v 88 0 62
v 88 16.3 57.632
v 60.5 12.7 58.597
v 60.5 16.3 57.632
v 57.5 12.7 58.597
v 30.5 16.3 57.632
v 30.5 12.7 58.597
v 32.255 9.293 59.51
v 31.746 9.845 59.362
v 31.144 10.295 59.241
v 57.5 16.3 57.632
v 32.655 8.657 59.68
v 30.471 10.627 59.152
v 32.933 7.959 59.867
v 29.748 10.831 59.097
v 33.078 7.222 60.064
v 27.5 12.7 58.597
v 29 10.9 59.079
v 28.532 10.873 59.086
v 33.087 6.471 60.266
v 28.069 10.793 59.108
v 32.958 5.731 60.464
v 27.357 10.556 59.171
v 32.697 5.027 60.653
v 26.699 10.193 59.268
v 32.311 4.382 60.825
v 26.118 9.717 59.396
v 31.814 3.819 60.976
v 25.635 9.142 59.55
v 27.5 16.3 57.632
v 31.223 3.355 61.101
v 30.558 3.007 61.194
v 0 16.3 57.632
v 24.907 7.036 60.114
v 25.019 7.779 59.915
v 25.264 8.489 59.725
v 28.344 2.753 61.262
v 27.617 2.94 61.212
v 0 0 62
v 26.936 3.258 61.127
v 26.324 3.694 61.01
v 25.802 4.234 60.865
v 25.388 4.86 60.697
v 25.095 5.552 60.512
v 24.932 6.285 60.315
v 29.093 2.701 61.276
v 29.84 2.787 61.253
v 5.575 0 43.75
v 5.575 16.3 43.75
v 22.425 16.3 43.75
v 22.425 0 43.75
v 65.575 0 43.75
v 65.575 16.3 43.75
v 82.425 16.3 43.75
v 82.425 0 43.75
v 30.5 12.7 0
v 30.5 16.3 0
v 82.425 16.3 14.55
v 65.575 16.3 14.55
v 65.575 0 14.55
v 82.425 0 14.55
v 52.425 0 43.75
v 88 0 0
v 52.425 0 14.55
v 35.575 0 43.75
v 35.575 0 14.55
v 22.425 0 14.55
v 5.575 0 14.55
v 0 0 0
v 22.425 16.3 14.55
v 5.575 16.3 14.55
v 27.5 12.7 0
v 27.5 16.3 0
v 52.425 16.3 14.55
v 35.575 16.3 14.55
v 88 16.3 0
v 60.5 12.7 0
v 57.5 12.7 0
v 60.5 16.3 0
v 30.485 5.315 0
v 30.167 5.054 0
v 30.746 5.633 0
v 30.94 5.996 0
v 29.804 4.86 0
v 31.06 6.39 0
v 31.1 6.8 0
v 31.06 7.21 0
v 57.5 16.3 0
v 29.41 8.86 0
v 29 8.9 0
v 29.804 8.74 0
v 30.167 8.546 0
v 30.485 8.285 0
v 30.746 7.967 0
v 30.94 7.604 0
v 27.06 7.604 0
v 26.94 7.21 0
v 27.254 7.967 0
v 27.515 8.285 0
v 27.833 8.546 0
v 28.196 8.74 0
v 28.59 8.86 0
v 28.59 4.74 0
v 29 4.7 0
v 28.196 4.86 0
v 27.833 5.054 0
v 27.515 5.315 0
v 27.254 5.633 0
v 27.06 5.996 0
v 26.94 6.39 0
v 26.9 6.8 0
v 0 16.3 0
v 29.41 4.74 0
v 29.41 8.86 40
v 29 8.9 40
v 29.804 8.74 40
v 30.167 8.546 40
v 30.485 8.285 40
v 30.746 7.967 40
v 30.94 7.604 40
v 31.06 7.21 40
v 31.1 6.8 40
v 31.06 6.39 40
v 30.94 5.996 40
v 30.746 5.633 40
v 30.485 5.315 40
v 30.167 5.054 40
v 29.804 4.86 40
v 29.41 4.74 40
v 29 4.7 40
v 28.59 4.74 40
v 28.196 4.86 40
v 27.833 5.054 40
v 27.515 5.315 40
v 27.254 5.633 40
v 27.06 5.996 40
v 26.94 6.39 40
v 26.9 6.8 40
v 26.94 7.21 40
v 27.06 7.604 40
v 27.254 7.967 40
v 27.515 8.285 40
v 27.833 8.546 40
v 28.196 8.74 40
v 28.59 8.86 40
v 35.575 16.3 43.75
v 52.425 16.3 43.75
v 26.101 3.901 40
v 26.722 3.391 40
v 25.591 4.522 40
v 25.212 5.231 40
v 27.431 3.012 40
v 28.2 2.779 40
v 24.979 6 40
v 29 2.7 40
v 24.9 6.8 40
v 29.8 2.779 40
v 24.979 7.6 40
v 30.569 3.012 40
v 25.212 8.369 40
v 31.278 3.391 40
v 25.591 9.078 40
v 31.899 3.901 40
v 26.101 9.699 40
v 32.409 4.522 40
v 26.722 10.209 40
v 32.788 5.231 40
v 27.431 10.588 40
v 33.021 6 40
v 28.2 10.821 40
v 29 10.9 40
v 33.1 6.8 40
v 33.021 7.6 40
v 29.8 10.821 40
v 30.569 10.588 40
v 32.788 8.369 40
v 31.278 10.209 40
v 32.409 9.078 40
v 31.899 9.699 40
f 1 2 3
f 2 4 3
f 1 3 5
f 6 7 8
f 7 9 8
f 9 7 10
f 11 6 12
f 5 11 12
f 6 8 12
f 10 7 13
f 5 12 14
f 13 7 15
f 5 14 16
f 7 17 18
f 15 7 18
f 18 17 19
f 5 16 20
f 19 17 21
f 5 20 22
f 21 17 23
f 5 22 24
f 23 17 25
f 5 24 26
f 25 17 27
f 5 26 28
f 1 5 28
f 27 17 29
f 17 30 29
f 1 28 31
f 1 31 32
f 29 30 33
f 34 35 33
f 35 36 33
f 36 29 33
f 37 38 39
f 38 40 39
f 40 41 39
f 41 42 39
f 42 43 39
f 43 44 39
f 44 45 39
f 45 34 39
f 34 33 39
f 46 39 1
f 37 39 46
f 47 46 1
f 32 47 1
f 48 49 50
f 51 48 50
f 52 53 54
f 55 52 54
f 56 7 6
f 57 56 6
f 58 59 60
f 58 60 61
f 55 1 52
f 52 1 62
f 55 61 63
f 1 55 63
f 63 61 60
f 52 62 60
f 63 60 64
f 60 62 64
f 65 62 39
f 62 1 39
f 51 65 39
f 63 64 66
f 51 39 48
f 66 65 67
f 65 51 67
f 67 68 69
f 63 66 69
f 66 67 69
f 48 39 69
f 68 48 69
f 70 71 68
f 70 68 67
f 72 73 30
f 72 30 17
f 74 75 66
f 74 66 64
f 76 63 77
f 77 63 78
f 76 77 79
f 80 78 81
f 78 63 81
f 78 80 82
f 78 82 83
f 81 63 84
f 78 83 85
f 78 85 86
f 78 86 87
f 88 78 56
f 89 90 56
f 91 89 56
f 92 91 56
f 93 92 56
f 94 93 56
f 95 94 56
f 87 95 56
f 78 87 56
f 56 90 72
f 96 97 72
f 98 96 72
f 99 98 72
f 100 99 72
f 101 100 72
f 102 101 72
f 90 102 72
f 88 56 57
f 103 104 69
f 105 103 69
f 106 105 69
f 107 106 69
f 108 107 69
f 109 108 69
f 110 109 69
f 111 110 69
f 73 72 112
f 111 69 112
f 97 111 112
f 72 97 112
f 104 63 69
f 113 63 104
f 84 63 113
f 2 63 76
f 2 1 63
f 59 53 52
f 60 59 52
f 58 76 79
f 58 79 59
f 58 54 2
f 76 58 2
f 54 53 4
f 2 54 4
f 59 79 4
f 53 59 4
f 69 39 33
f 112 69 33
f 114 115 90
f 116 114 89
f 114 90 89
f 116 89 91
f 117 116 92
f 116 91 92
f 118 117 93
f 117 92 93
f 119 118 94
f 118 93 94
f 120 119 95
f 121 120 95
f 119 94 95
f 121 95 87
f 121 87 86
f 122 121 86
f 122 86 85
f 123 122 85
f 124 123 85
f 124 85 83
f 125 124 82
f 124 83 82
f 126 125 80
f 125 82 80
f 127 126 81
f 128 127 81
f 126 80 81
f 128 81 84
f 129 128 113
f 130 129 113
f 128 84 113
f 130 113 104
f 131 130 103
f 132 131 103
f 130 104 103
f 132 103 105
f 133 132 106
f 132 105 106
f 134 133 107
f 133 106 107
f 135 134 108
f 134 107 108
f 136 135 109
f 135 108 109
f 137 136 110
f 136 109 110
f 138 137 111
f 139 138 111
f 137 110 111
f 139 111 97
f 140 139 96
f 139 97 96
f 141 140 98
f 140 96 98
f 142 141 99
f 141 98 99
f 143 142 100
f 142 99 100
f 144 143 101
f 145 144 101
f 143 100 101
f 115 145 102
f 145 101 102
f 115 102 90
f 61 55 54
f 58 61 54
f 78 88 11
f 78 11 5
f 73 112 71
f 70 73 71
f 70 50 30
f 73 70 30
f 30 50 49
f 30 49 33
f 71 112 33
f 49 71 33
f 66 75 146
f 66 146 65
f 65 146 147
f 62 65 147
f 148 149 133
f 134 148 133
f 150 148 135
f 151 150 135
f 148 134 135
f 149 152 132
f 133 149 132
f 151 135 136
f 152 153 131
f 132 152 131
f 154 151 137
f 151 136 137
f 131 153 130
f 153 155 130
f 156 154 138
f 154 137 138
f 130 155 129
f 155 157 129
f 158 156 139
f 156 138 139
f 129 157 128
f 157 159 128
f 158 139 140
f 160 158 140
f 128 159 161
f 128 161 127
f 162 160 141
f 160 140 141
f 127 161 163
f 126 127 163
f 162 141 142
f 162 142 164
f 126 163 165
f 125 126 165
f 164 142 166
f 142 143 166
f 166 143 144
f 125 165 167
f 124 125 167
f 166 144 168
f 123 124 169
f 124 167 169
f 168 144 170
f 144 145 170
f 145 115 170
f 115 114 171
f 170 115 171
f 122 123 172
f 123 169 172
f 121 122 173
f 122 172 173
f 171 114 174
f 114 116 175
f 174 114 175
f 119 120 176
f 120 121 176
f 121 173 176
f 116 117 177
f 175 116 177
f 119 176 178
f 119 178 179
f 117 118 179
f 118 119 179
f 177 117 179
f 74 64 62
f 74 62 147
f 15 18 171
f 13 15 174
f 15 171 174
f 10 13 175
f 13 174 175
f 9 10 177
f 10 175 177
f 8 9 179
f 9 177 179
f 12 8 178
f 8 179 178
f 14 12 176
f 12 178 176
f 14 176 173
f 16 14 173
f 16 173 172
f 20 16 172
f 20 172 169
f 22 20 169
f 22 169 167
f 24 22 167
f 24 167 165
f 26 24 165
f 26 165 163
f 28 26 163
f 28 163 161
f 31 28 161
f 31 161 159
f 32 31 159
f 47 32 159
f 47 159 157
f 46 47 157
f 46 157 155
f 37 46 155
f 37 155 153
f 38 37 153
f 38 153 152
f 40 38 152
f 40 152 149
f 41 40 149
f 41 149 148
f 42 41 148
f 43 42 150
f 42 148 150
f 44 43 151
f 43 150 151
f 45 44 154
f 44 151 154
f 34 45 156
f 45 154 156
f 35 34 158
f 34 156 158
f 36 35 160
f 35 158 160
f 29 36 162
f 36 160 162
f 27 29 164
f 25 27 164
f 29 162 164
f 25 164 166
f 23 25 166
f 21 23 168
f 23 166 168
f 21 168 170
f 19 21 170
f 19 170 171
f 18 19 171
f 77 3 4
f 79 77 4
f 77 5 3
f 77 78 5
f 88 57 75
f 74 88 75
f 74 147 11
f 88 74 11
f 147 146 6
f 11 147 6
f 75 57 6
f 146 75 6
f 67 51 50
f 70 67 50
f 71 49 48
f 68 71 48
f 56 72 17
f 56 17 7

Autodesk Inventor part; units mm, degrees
sketch "Sketch_1" plane through (0, 0, 0) normal (1, 0, 0) x (0, 1, 0)
  line L0 (0, 61.9996) -> (0, 0)
  line L1 (0, 0) -> (16.3, 0)
  line L2 (16.3, 0) -> (16.3, 57.632)
  line L3 (16.3, 57.632) -> (0, 61.9996)
extrude "Extrusion1" add sketch "Sketch_1" along normal blind 88
sketch "Sketch_2" plane through (0, 0, 0) normal (0, 0, 1) x (1, 0, 0)
  line L0 (27.5, 20.7) -> (27.5, 12.7)
  line L1 (27.5, 12.7) -> (30.5, 12.7)
  line L2 (30.5, 12.7) -> (30.5, 17.7)
  line L3 (30.5, 17.7) -> (57.5, 17.7)
  line L4 (57.5, 17.7) -> (57.5, 12.7)
  line L5 (57.5, 12.7) -> (60.5, 12.7)
  line L6 (60.5, 12.7) -> (60.5, 20.7)
  line L7 (60.5, 20.7) -> (27.5, 20.7)
extrude "Extrusion2" cut sketch "Sketch_2" along normal blind 65
sketch "Sketch_3" plane through (0, 0, 14.55) normal (0, 0, 1) x (1, 0, 0)
  line L0 (5.575, 27) -> (5.575, 0)
  line L1 (5.575, 0) -> (22.425, 0)
  line L2 (22.425, 0) -> (22.425, 22)
  line L3 (22.425, 22) -> (35.575, 22)
  line L4 (35.575, 22) -> (35.575, 0)
  line L5 (35.575, 0) -> (52.425, 0)
  line L6 (52.425, 0) -> (52.425, 22)
  line L7 (52.425, 22) -> (65.575, 22)
  line L8 (65.575, 22) -> (65.575, 0)
  line L9 (65.575, 0) -> (82.425, 0)
  line L10 (82.425, 0) -> (82.425, 27)
  line L11 (82.425, 27) -> (5.575, 27)
extrude "Extrusion3" cut sketch "Sketch_3" along normal blind 29.2
sketch "Sketch_5" plane through (29, 0, 0) normal (1, 0, 0) x (0, 0, -1)
  line L0 (0, 6.8) -> (-63, 6.8)
  line L1 (-63, 6.8) -> (-63, 10.9)
  line L2 (-63, 10.9) -> (-40, 10.9)
  line L3 (-40, 10.9) -> (-40, 8.9)
  line L4 (-40, 8.9) -> (0, 8.9)
  line L5 (0, 8.9) -> (0, 6.8)
  line L6 (0, 6.8) -> (-63, 6.8)
revolve "Revolution1" cut sketch "Sketch_5" angle 360 about axis through (29, 6.8, 0) along (0, 0, -1)
ref_plane "P2_XY" through (-1, 0, 0) normal (0, -1, 0) x (1, 0, 0)
ref_plane "P2_YZ" through (-1, 0, 0) normal (1, 0, 0) x (0, 0, 1)
ref_plane "P2_ZX" through (-1, 0, 0) normal (0, 0, 1) x (0, -1, 0)
properties part number "nzm1_3p_p2"
